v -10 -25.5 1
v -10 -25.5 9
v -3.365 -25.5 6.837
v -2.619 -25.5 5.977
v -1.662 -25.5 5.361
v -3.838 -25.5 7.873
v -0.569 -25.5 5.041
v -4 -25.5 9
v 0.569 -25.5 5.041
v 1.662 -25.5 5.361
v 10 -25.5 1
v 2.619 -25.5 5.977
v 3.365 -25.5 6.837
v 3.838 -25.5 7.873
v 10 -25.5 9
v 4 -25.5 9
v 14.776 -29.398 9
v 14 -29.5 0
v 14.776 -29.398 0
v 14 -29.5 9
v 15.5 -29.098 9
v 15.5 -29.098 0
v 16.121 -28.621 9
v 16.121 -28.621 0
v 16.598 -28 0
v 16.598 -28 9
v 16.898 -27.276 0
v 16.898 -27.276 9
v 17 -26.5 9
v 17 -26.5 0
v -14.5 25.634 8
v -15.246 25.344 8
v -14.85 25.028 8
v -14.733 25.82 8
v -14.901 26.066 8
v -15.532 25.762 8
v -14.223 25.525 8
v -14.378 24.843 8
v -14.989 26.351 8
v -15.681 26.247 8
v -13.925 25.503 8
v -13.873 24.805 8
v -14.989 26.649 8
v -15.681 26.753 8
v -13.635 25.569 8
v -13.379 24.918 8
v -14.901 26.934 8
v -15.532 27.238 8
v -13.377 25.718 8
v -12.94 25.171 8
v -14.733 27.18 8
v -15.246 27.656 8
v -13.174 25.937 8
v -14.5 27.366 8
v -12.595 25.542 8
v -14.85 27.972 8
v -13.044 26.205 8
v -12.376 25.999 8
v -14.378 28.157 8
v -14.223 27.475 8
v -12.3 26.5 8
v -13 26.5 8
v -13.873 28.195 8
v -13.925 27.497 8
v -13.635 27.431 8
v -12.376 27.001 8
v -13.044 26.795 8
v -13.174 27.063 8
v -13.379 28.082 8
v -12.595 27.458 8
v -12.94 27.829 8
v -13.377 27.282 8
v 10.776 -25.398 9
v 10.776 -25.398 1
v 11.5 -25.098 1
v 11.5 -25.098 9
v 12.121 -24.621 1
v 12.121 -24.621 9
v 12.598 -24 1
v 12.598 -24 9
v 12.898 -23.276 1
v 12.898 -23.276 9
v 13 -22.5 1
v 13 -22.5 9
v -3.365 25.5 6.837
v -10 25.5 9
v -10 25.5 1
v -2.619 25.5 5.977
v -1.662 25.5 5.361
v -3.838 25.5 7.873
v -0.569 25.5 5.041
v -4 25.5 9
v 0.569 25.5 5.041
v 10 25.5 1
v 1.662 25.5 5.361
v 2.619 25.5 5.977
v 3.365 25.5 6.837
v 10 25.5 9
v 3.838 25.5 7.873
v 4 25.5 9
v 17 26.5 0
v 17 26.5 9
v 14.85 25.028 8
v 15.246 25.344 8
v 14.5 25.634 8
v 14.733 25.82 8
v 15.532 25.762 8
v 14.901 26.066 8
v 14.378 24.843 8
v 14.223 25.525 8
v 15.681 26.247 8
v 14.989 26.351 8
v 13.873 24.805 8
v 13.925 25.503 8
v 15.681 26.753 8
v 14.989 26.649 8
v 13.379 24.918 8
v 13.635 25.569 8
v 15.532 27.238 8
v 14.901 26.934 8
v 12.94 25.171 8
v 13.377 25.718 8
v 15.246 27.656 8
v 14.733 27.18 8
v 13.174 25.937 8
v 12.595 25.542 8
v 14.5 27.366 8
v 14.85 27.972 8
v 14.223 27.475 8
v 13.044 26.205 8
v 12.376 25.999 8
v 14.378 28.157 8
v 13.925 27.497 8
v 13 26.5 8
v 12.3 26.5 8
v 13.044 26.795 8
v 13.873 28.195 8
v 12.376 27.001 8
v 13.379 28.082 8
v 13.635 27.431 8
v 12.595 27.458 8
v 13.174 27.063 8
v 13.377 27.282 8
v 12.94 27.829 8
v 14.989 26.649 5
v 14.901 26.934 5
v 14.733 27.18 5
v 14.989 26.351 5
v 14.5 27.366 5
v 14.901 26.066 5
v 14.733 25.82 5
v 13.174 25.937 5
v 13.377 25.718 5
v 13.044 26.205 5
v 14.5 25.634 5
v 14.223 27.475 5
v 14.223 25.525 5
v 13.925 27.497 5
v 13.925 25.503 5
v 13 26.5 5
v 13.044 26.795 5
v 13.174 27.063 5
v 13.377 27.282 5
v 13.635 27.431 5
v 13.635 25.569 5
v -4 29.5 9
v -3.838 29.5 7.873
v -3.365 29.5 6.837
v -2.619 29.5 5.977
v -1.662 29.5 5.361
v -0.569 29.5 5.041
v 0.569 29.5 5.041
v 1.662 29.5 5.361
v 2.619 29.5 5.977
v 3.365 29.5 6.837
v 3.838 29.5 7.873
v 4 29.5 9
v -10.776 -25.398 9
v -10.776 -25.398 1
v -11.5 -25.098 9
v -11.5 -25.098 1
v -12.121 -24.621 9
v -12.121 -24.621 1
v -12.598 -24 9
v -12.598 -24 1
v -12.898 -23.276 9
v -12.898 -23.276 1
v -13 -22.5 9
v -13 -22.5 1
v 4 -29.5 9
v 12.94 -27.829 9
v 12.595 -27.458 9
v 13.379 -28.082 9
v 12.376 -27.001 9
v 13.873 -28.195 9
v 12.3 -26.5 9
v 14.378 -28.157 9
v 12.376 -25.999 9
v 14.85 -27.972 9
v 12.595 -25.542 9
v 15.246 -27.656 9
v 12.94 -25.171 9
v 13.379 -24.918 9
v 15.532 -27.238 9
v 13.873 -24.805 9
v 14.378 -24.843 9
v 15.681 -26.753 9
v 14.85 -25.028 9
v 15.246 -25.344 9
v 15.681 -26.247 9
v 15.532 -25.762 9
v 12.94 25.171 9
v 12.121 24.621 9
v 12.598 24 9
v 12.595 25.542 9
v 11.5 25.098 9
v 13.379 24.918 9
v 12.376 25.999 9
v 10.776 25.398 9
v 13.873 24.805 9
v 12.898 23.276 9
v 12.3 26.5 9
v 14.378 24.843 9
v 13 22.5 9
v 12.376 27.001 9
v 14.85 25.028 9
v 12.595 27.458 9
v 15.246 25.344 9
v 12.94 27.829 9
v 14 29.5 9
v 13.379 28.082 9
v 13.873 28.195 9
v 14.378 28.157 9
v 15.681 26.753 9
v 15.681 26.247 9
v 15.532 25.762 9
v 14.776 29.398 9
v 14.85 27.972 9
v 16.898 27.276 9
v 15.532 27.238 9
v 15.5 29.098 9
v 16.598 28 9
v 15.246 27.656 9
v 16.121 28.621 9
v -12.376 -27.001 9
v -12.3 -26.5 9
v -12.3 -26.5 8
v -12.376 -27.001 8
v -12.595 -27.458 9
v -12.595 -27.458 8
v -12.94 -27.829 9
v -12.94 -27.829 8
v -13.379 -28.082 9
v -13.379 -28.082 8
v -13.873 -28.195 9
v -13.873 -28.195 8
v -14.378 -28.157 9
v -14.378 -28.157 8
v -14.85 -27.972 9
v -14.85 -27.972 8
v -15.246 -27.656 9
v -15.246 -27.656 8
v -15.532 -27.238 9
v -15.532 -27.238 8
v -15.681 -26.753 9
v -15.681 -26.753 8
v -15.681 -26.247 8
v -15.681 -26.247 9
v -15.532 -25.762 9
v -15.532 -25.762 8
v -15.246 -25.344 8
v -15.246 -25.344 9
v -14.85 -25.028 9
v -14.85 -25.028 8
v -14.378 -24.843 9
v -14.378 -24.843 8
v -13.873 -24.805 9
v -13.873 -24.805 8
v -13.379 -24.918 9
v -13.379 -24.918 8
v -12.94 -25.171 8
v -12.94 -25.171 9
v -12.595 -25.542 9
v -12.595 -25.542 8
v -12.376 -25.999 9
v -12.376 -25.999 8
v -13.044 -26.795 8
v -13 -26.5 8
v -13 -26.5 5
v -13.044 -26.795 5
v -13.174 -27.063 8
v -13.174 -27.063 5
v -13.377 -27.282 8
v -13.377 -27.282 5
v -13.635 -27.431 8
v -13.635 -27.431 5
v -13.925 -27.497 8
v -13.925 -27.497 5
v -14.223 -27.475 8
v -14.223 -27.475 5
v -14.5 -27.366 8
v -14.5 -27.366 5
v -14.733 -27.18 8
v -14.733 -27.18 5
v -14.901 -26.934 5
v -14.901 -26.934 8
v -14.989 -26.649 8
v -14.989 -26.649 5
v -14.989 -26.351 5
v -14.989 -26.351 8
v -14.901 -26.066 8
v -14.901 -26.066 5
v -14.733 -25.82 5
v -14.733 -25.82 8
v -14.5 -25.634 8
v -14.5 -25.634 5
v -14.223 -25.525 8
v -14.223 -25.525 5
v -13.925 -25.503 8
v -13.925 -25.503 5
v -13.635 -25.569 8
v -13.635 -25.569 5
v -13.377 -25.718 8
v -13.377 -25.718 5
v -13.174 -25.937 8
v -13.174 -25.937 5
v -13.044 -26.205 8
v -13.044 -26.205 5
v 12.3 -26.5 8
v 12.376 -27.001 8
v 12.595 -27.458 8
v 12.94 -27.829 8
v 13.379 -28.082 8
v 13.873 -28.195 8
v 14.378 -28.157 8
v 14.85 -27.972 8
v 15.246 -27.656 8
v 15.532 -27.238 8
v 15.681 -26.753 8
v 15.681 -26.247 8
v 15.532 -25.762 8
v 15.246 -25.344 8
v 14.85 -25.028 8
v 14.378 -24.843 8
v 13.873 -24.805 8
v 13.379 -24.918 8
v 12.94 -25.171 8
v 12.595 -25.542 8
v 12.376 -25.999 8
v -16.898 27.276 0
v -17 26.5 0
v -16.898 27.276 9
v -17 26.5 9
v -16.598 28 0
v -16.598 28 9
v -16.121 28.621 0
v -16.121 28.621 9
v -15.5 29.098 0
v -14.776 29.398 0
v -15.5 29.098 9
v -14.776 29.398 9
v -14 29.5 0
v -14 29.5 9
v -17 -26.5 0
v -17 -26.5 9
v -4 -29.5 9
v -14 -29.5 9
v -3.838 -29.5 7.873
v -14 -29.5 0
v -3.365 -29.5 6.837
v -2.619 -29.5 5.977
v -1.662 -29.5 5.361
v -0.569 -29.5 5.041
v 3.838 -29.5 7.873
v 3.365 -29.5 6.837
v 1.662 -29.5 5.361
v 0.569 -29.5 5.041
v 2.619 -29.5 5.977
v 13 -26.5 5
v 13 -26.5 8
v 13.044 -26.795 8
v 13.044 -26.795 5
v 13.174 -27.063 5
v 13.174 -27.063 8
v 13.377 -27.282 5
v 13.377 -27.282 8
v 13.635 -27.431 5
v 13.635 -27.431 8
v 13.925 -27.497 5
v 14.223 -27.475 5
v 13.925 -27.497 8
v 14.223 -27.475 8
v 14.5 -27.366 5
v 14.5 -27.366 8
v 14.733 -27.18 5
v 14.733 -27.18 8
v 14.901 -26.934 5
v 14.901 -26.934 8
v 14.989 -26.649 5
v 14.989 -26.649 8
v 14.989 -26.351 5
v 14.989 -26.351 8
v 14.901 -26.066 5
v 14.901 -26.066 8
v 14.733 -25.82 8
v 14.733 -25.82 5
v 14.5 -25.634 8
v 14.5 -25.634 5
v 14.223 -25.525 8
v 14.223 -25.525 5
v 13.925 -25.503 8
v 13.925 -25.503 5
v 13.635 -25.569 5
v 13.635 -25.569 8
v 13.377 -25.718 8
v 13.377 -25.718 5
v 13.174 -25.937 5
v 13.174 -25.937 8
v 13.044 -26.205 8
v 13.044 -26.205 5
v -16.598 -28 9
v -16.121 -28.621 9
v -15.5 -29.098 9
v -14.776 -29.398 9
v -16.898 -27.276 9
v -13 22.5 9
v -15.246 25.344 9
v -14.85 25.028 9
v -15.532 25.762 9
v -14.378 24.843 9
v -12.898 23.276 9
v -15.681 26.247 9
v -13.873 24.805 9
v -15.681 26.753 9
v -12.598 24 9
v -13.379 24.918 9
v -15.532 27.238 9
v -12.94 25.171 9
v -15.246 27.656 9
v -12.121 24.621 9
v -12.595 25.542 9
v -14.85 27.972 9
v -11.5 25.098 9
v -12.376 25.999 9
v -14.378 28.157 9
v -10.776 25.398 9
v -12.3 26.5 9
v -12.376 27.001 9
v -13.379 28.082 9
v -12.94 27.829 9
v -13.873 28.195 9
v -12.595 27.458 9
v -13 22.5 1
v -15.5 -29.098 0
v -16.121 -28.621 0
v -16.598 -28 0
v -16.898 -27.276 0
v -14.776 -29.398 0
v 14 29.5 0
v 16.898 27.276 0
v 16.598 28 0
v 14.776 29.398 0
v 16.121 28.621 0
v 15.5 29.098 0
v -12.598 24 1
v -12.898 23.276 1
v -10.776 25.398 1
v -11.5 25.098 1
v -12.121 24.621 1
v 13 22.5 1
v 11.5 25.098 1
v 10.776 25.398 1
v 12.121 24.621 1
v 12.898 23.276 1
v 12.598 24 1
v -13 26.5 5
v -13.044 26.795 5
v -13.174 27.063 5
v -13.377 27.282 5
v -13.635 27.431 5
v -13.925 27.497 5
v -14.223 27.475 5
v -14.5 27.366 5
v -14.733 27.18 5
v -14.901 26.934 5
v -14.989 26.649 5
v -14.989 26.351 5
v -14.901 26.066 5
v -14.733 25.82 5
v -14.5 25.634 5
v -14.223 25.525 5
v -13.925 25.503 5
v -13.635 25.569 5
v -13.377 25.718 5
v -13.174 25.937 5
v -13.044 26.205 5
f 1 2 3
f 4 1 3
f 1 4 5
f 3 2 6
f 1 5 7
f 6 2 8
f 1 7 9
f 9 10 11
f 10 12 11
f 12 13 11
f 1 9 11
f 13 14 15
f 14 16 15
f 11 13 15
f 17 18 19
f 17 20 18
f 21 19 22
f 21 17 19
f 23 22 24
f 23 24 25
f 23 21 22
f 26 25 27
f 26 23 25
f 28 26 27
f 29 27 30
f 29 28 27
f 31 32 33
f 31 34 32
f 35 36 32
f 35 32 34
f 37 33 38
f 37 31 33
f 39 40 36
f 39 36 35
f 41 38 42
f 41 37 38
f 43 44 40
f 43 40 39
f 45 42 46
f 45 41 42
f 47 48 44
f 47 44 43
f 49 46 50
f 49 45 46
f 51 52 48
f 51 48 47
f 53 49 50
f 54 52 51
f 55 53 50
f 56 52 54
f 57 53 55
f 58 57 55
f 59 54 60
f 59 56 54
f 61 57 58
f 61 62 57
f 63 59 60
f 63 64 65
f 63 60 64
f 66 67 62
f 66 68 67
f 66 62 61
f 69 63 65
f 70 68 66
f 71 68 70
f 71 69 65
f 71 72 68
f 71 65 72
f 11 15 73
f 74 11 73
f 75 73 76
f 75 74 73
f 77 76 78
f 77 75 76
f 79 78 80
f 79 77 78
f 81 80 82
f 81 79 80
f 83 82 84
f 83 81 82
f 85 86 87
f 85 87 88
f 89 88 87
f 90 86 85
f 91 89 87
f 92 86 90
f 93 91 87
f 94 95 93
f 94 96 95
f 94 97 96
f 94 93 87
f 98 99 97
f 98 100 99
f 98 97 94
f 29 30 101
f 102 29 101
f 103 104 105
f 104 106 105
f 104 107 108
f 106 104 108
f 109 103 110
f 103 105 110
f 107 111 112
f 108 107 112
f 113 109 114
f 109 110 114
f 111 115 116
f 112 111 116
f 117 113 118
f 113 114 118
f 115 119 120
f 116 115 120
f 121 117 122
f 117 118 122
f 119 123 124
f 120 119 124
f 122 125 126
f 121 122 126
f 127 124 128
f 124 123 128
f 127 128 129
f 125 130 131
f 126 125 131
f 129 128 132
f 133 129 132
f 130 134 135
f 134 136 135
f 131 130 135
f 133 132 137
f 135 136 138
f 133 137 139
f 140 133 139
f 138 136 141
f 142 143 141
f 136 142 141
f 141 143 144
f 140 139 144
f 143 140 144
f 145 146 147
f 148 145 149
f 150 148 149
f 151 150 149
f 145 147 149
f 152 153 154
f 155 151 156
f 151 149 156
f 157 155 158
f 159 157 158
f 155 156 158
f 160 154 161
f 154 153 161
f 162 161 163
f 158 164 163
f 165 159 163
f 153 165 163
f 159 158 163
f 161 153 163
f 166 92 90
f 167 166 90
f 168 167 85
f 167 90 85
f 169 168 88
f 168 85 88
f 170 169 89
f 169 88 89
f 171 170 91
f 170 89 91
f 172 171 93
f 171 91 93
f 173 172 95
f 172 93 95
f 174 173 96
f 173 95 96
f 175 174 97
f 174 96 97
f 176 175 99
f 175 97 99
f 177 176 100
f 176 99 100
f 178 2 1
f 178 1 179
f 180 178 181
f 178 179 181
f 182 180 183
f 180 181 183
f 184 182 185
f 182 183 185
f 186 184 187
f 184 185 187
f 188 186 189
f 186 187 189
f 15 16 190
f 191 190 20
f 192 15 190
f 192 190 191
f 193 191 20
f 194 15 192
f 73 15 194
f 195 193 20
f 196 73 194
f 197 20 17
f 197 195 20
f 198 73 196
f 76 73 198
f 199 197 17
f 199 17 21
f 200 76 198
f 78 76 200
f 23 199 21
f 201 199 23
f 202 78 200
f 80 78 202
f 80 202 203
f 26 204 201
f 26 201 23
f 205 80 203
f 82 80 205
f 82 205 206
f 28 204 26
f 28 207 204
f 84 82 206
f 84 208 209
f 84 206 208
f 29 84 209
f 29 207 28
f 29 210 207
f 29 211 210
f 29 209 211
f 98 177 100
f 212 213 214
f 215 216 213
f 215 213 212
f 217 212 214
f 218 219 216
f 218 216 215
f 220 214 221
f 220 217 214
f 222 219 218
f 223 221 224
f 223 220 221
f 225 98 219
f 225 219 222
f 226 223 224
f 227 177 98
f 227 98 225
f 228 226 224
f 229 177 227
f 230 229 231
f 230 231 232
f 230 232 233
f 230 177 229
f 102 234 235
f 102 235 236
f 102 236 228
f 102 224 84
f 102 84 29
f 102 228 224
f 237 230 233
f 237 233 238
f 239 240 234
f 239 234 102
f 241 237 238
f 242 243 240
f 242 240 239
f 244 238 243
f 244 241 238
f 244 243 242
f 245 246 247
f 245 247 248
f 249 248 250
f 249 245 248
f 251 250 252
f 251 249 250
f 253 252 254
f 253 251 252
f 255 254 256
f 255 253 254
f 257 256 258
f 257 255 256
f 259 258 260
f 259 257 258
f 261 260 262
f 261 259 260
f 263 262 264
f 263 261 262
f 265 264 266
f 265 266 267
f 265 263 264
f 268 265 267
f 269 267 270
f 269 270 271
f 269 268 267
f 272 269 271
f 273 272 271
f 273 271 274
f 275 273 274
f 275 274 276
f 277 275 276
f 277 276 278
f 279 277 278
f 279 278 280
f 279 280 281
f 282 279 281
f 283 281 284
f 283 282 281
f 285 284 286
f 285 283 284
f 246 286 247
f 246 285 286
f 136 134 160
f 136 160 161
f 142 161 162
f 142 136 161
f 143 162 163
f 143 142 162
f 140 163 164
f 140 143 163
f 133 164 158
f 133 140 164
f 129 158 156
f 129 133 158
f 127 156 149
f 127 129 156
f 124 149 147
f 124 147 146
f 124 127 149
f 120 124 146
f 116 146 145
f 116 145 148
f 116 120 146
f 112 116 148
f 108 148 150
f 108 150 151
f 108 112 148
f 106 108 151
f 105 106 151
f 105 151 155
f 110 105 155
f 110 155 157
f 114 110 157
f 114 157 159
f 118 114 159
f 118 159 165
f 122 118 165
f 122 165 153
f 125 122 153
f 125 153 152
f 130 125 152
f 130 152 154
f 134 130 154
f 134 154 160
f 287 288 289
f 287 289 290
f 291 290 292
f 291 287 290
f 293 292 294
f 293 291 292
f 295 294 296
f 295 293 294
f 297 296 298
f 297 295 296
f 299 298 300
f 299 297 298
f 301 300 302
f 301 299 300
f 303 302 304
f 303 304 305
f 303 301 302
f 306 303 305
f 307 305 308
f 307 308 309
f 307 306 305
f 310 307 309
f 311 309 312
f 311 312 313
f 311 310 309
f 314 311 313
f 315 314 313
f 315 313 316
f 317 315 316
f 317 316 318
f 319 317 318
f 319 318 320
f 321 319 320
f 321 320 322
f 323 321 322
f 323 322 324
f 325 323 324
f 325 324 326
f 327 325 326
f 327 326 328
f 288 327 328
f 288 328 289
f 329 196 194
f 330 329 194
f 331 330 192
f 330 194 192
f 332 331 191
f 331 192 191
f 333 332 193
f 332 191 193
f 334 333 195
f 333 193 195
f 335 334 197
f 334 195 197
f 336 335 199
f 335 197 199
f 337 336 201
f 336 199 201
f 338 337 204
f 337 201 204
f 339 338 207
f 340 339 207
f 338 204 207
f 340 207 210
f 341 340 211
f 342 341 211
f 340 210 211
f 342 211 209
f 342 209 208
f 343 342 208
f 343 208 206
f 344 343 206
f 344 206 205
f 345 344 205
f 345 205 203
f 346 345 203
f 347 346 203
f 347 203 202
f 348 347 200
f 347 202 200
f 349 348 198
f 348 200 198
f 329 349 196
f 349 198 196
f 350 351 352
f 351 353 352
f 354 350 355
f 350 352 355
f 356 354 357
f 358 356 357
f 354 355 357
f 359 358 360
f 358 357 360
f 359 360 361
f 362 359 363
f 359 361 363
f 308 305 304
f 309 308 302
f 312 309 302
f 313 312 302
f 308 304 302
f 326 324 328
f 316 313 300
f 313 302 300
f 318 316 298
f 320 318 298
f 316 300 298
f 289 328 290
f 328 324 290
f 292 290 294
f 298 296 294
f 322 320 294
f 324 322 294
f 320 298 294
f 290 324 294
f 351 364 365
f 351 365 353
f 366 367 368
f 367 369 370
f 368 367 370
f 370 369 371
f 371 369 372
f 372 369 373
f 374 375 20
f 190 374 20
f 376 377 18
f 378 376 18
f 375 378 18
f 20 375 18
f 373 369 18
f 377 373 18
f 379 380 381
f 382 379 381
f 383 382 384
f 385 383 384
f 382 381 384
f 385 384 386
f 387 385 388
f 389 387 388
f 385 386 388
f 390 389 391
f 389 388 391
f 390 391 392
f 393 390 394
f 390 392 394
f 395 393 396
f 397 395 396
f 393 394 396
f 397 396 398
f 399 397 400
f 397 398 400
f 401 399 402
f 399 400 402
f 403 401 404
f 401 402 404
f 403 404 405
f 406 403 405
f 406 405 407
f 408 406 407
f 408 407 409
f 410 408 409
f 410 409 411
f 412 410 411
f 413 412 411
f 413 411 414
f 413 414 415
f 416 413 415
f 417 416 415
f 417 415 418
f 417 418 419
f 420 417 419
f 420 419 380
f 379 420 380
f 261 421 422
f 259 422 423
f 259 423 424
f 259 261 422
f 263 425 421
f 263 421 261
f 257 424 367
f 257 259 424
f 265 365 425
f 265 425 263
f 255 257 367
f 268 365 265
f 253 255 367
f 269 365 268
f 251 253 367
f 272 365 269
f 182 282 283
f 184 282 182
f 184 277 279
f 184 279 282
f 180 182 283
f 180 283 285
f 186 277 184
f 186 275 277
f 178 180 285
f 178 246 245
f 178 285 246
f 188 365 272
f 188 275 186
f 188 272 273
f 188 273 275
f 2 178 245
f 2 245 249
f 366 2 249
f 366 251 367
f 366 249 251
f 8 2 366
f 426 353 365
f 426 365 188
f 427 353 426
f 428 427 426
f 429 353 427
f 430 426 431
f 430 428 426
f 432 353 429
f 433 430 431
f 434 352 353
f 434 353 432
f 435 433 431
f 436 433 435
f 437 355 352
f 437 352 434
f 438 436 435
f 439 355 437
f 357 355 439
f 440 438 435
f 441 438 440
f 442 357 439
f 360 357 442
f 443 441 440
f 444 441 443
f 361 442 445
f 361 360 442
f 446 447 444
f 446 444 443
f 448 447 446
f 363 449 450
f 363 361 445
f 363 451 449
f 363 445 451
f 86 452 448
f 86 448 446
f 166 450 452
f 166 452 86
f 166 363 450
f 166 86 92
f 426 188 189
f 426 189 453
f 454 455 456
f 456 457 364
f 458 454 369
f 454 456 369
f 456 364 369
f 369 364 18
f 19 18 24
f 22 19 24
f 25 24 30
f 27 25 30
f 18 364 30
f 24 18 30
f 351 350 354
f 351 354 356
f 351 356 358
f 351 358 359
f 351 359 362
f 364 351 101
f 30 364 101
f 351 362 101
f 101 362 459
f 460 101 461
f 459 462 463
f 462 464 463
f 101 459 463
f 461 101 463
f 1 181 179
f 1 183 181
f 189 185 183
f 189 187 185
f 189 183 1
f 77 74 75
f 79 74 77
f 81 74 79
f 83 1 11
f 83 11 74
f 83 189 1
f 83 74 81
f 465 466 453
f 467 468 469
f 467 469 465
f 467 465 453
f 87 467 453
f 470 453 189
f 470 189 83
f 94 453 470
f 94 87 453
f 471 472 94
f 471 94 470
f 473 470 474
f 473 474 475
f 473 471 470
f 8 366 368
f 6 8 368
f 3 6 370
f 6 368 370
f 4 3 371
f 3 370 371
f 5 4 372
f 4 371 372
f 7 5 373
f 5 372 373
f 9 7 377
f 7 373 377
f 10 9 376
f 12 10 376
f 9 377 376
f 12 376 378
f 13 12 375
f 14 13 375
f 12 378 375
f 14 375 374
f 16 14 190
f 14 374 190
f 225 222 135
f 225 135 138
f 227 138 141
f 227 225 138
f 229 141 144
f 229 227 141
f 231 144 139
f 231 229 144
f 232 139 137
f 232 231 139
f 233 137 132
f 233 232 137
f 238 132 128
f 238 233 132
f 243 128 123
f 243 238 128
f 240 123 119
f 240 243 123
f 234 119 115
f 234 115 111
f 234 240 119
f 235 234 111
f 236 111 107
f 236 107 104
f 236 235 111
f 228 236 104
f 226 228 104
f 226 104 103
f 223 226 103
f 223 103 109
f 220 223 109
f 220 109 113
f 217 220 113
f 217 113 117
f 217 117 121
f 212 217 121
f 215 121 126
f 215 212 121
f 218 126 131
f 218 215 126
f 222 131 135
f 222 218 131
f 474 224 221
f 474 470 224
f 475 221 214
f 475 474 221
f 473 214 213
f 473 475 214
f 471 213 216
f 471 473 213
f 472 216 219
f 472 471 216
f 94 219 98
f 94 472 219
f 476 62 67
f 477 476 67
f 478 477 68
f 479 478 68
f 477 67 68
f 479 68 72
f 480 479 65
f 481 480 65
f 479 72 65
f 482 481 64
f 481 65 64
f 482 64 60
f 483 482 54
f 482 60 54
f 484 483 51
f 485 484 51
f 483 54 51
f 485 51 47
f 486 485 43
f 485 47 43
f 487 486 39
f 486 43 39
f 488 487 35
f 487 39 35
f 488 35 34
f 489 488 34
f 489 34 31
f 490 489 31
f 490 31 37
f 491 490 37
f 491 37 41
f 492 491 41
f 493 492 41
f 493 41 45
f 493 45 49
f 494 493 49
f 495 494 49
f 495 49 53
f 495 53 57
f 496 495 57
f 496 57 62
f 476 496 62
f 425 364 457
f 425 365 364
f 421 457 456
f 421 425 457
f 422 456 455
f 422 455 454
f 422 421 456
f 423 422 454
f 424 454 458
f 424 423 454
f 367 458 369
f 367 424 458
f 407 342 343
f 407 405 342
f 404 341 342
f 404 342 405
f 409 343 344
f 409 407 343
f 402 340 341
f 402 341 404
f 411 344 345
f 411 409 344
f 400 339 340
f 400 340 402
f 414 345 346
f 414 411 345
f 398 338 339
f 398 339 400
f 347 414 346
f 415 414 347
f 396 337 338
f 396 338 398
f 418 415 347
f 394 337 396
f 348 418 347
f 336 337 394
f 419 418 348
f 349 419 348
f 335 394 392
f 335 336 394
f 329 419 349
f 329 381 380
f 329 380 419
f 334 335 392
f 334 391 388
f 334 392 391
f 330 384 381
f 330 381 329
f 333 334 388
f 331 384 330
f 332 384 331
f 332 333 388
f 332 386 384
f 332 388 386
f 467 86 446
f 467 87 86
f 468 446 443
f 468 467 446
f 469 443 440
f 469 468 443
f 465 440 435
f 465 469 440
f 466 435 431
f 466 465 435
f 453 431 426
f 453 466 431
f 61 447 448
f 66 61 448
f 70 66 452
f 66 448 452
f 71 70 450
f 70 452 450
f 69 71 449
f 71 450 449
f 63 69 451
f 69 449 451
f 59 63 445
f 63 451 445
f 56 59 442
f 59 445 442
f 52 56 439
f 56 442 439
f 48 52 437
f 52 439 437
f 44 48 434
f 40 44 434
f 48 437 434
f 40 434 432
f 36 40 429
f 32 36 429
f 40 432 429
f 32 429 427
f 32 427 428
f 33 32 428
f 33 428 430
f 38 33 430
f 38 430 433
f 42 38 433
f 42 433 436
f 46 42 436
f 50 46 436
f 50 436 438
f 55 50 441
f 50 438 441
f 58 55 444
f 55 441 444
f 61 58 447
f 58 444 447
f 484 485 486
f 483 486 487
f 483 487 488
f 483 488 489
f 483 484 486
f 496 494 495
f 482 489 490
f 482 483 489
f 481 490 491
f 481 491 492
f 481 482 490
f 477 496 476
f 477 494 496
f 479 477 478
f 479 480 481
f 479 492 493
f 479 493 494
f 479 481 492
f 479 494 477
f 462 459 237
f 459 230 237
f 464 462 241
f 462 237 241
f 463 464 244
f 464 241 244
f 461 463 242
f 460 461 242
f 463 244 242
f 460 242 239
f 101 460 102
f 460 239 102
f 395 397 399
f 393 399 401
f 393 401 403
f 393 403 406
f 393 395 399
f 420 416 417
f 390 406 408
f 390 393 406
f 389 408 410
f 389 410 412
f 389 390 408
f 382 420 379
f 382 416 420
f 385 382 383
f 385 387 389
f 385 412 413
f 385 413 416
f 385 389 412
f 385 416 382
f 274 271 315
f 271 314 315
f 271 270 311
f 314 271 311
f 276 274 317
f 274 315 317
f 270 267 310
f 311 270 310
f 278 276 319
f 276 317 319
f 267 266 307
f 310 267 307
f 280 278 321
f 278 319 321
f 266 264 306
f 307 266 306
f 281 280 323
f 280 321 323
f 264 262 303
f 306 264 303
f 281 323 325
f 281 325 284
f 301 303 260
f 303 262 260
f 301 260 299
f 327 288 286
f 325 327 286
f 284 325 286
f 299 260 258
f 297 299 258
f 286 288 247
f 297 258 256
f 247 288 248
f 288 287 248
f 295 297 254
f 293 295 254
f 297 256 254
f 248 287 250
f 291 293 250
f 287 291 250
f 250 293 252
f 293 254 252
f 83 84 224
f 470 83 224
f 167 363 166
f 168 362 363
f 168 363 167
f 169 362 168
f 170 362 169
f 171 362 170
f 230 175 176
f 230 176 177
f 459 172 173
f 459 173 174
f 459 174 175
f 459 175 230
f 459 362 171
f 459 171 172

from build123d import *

# Parameters (mm, degrees)
SKETCH008_W                   = 34
SKETCH008_H                   = 59
PAD002_DEPTH                  = 9
SKETCH009_W                   = 26
SKETCH009_H                   = 51
POCKET005_DEPTH               = 8
FILLET003_R                   = 3
SKETCH010_R                   = 1
POCKET006_DEPTH               = 4
SKETCH010_MIRRORED004_2_R     = 1
POCKET006_MIRRORED004_2_DEPTH = 4
SKETCH011_R                   = 1.7
POCKET007_DEPTH               = 1
SKETCH011_MIRRORED006_2_R     = 1.7
POCKET007_MIRRORED006_2_DEPTH = 1
SKETCH016_R                   = 4
POCKET011_DEPTH               = 59.001


with BuildPart() as part:
    # Sketch008 → Pad002 (new body)
    with BuildSketch(Plane.XY):
        Rectangle(SKETCH008_W, SKETCH008_H)
    extrude(amount=PAD002_DEPTH)

    # Sketch009 (on Face6 of Pad002) → Pocket005 (cut)
    with BuildSketch(Plane.XY.offset(9)):
        Rectangle(SKETCH009_W, SKETCH009_H)
    extrude(amount=-POCKET005_DEPTH, mode=Mode.SUBTRACT)

    # Fillet003
    fillet003_edges = [part.edges().sort_by_distance(p)[0] for p in [
        (-13, 25.5, 5),
        (-17, 29.5, 4.5),
        (17, 29.5, 4.5),
        (13, 25.5, 5),
        (17, -29.5, 4.5),
        (13, -25.5, 5),
        (-13, -25.5, 5),
        (-17, -29.5, 4.5),
    ]]
    fillet(fillet003_edges, radius=FILLET003_R)

    # Sketch010 (on Face5 of Fillet003) → Pocket006 (cut)
    with BuildSketch(Plane.XY.offset(9)):
        with Locations((-14, 26.5)):
            Circle(SKETCH010_R)
    pocket006 = extrude(amount=-POCKET006_DEPTH, mode=Mode.SUBTRACT)

    # Sketch010 Mirrored004 2 → Pocket006 Mirrored004 2 (cut)
    with BuildSketch(Plane(origin=(0, 0, 9), x_dir=(-1, 0, 0), z_dir=(0, 0, -1))):
        with Locations((-14, 26.5)):
            Circle(SKETCH010_MIRRORED004_2_R)
    pocket006_mirrored004_2 = extrude(amount=POCKET006_MIRRORED004_2_DEPTH, mode=Mode.SUBTRACT)

    # Mirrored005: Pocket006, Pocket006 Mirrored004 2 across Sketch010 H_Axis
    add(pocket006.mirror(Plane(origin=(0, 0, 9), x_dir=(0, 0, 1), z_dir=(0, 1, 0))), mode=Mode.SUBTRACT)
    add(pocket006_mirrored004_2.mirror(Plane(origin=(0, 0, 9), x_dir=(0, 0, 1), z_dir=(0, 1, 0))), mode=Mode.SUBTRACT)

    # Sketch011 (on Face5 of MultiTransform002) → Pocket007 (cut)
    with BuildSketch(Plane.XY.offset(9)):
        with Locations((-14, 26.5)):
            Circle(SKETCH011_R)
    pocket007 = extrude(amount=-POCKET007_DEPTH, mode=Mode.SUBTRACT)

    # Sketch011 Mirrored006 2 → Pocket007 Mirrored006 2 (cut)
    with BuildSketch(Plane(origin=(0, 0, 9), x_dir=(-1, 0, 0), z_dir=(0, 0, -1))):
        with Locations((-14, 26.5)):
            Circle(SKETCH011_MIRRORED006_2_R)
    pocket007_mirrored006_2 = extrude(amount=POCKET007_MIRRORED006_2_DEPTH, mode=Mode.SUBTRACT)

    # Mirrored007: Pocket007, Pocket007 Mirrored006 2 across Sketch011 H_Axis
    add(pocket007.mirror(Plane(origin=(0, 0, 9), x_dir=(0, 0, 1), z_dir=(0, 1, 0))), mode=Mode.SUBTRACT)
    add(pocket007_mirrored006_2.mirror(Plane(origin=(0, 0, 9), x_dir=(0, 0, 1), z_dir=(0, 1, 0))), mode=Mode.SUBTRACT)

    # Sketch016 (on Face10 of MultiTransform003) → Pocket011 (cut, through all)
    with BuildSketch(Plane.XZ.offset(29.5)):
        with Locations((0, 9)):
            Circle(SKETCH016_R)
    extrude(amount=-POCKET011_DEPTH, mode=Mode.SUBTRACT)


solid = part.part
